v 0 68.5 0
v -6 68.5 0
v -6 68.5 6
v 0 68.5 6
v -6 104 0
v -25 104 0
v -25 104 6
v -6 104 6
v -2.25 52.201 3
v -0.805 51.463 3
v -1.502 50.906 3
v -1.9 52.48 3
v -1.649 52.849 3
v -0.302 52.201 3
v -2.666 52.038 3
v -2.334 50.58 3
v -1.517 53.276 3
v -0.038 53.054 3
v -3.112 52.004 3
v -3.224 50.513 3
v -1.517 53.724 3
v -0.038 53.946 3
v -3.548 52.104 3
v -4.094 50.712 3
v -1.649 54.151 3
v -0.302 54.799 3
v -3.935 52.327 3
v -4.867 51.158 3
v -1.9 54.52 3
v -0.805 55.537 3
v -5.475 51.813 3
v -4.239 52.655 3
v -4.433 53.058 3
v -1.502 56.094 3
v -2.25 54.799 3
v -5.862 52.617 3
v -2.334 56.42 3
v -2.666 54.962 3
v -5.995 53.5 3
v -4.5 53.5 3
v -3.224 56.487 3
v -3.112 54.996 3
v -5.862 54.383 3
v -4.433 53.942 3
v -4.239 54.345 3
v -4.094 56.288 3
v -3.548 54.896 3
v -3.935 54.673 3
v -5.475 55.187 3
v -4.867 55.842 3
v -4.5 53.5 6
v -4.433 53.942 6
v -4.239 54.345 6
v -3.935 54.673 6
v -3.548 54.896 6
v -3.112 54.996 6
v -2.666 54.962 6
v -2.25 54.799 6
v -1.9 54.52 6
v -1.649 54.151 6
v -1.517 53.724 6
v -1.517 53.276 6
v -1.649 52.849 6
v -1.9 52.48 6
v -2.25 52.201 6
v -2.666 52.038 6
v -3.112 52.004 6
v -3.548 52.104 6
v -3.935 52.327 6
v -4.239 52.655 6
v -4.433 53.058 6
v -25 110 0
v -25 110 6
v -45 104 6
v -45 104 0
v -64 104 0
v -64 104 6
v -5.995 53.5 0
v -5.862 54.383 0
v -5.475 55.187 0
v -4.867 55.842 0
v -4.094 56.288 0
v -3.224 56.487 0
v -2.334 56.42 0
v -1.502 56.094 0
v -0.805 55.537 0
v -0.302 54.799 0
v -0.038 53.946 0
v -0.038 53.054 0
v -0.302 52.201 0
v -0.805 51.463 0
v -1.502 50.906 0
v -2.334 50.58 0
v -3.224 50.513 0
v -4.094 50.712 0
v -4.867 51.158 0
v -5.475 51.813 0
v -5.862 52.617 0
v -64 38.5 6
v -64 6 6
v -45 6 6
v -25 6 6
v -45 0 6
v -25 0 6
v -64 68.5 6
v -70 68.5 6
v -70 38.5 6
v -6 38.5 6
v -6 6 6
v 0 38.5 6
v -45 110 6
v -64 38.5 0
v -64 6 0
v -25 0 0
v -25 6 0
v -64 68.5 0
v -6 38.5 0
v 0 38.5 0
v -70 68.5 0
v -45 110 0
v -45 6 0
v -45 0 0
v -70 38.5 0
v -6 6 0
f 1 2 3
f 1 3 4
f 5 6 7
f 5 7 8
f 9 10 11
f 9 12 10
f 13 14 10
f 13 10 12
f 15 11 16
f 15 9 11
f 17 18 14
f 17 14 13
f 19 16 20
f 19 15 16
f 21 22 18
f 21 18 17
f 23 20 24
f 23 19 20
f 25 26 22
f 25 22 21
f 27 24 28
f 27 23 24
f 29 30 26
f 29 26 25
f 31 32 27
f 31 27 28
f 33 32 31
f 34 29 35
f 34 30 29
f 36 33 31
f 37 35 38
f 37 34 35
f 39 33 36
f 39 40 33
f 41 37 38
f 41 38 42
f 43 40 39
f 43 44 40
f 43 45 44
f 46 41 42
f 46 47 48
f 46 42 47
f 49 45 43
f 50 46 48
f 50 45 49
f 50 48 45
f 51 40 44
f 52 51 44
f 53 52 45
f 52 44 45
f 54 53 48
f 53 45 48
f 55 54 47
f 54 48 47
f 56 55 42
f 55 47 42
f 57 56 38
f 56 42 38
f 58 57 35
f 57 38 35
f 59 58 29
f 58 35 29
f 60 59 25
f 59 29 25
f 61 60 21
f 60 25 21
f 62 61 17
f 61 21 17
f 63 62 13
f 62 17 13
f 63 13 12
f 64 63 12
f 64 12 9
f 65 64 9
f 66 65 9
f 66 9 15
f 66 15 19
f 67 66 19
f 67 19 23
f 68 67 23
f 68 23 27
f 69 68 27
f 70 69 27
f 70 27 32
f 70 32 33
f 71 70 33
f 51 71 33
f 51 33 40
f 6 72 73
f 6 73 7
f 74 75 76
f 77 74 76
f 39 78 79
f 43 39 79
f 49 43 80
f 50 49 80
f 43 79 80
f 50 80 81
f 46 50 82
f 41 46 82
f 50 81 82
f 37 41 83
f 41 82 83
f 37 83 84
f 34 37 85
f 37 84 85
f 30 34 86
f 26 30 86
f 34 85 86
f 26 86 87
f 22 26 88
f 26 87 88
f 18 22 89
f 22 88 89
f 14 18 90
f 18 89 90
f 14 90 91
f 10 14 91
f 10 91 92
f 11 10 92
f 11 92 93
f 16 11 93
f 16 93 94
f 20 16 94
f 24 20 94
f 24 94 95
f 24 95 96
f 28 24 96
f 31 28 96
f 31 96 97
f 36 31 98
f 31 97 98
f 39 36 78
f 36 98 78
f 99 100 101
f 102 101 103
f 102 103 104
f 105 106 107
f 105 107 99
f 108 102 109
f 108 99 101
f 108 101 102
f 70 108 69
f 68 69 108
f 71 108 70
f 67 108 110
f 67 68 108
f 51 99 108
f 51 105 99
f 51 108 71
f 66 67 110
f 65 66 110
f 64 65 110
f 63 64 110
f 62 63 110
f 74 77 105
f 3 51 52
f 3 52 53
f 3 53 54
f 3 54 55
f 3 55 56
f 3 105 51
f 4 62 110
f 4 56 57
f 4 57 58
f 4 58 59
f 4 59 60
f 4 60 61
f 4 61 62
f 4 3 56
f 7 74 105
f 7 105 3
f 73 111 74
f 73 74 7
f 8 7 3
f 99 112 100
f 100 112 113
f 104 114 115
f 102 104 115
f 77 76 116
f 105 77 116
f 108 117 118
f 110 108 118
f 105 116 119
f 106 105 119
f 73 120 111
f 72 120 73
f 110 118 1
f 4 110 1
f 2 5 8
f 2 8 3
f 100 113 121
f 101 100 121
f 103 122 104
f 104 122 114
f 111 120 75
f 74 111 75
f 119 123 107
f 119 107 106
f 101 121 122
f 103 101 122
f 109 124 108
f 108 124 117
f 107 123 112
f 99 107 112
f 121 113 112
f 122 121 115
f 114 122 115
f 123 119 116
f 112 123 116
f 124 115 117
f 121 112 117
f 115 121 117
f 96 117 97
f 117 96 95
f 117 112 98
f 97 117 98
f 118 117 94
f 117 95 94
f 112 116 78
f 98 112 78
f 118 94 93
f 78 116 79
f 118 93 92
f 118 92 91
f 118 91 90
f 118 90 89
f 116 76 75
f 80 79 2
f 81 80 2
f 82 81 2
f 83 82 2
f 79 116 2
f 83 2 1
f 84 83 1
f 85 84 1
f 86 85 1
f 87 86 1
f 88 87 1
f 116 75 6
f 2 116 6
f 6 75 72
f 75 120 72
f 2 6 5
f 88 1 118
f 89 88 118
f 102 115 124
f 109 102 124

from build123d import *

# Parameters (mm, degrees)
ESQUISSE1_W             = 70
ESQUISSE1_H             = 110
BOSS_EXTRU_1_DEPTH      = 6
ENL_V_MAT_EXTRU_1_DEPTH = 131.522028792
ESQUISSE3_R             = 1.5
ENL_V_MAT_EXTRU_2_DEPTH = 131.522028792
ESQUISSE4_R             = 2.995
ENL_V_MAT_EXTRU_3_DEPTH = 3


with BuildPart() as part:
    # Esquisse1 → Boss.-Extru.1 (new body)
    with BuildSketch(Plane.XY):
        with Locations((-35, 55)):
            Rectangle(ESQUISSE1_W, ESQUISSE1_H)
    extrude(amount=BOSS_EXTRU_1_DEPTH)

    # Esquisse2 → Enlèv. mat.-Extru.1 (cut, through all)
    with BuildSketch(Plane(origin=(0, 0, 0), x_dir=(-1, 0, 0), z_dir=(0, 0, -1))):
        Polygon((0, 110), (25, 110), (25, 104), (6, 104), (6, 68.5), (0, 68.5), align=None)
        Polygon((70, 110), (45, 110), (45, 104), (64, 104), (64, 68.5), (70, 68.5), align=None)
        Polygon((0, 0), (25, 0), (25, 6), (6, 6), (6, 38.5), (0, 38.5), align=None)
        Polygon((45, 0), (70, 0), (70, 38.5), (64, 38.5), (64, 6), (45, 6), align=None)
    extrude(amount=-ENL_V_MAT_EXTRU_1_DEPTH, mode=Mode.SUBTRACT)

    # Esquisse3 → Enlèv. mat.-Extru.2 (cut, through all)
    with BuildSketch(Plane(origin=(0, 0, 0), x_dir=(-1, 0, 0), z_dir=(0, 0, -1))):
        with Locations((3, 53.5)):
            Circle(ESQUISSE3_R)
    extrude(amount=-ENL_V_MAT_EXTRU_2_DEPTH, mode=Mode.SUBTRACT)

    # Esquisse4 → Enlèv. mat.-Extru.3 (cut)
    with BuildSketch(Plane(origin=(0, 0, 0), x_dir=(-1, 0, 0), z_dir=(0, 0, -1))):
        with Locations((3, 53.5)):
            Circle(ESQUISSE4_R)
    extrude(amount=-ENL_V_MAT_EXTRU_3_DEPTH, mode=Mode.SUBTRACT)


solid = part.part
